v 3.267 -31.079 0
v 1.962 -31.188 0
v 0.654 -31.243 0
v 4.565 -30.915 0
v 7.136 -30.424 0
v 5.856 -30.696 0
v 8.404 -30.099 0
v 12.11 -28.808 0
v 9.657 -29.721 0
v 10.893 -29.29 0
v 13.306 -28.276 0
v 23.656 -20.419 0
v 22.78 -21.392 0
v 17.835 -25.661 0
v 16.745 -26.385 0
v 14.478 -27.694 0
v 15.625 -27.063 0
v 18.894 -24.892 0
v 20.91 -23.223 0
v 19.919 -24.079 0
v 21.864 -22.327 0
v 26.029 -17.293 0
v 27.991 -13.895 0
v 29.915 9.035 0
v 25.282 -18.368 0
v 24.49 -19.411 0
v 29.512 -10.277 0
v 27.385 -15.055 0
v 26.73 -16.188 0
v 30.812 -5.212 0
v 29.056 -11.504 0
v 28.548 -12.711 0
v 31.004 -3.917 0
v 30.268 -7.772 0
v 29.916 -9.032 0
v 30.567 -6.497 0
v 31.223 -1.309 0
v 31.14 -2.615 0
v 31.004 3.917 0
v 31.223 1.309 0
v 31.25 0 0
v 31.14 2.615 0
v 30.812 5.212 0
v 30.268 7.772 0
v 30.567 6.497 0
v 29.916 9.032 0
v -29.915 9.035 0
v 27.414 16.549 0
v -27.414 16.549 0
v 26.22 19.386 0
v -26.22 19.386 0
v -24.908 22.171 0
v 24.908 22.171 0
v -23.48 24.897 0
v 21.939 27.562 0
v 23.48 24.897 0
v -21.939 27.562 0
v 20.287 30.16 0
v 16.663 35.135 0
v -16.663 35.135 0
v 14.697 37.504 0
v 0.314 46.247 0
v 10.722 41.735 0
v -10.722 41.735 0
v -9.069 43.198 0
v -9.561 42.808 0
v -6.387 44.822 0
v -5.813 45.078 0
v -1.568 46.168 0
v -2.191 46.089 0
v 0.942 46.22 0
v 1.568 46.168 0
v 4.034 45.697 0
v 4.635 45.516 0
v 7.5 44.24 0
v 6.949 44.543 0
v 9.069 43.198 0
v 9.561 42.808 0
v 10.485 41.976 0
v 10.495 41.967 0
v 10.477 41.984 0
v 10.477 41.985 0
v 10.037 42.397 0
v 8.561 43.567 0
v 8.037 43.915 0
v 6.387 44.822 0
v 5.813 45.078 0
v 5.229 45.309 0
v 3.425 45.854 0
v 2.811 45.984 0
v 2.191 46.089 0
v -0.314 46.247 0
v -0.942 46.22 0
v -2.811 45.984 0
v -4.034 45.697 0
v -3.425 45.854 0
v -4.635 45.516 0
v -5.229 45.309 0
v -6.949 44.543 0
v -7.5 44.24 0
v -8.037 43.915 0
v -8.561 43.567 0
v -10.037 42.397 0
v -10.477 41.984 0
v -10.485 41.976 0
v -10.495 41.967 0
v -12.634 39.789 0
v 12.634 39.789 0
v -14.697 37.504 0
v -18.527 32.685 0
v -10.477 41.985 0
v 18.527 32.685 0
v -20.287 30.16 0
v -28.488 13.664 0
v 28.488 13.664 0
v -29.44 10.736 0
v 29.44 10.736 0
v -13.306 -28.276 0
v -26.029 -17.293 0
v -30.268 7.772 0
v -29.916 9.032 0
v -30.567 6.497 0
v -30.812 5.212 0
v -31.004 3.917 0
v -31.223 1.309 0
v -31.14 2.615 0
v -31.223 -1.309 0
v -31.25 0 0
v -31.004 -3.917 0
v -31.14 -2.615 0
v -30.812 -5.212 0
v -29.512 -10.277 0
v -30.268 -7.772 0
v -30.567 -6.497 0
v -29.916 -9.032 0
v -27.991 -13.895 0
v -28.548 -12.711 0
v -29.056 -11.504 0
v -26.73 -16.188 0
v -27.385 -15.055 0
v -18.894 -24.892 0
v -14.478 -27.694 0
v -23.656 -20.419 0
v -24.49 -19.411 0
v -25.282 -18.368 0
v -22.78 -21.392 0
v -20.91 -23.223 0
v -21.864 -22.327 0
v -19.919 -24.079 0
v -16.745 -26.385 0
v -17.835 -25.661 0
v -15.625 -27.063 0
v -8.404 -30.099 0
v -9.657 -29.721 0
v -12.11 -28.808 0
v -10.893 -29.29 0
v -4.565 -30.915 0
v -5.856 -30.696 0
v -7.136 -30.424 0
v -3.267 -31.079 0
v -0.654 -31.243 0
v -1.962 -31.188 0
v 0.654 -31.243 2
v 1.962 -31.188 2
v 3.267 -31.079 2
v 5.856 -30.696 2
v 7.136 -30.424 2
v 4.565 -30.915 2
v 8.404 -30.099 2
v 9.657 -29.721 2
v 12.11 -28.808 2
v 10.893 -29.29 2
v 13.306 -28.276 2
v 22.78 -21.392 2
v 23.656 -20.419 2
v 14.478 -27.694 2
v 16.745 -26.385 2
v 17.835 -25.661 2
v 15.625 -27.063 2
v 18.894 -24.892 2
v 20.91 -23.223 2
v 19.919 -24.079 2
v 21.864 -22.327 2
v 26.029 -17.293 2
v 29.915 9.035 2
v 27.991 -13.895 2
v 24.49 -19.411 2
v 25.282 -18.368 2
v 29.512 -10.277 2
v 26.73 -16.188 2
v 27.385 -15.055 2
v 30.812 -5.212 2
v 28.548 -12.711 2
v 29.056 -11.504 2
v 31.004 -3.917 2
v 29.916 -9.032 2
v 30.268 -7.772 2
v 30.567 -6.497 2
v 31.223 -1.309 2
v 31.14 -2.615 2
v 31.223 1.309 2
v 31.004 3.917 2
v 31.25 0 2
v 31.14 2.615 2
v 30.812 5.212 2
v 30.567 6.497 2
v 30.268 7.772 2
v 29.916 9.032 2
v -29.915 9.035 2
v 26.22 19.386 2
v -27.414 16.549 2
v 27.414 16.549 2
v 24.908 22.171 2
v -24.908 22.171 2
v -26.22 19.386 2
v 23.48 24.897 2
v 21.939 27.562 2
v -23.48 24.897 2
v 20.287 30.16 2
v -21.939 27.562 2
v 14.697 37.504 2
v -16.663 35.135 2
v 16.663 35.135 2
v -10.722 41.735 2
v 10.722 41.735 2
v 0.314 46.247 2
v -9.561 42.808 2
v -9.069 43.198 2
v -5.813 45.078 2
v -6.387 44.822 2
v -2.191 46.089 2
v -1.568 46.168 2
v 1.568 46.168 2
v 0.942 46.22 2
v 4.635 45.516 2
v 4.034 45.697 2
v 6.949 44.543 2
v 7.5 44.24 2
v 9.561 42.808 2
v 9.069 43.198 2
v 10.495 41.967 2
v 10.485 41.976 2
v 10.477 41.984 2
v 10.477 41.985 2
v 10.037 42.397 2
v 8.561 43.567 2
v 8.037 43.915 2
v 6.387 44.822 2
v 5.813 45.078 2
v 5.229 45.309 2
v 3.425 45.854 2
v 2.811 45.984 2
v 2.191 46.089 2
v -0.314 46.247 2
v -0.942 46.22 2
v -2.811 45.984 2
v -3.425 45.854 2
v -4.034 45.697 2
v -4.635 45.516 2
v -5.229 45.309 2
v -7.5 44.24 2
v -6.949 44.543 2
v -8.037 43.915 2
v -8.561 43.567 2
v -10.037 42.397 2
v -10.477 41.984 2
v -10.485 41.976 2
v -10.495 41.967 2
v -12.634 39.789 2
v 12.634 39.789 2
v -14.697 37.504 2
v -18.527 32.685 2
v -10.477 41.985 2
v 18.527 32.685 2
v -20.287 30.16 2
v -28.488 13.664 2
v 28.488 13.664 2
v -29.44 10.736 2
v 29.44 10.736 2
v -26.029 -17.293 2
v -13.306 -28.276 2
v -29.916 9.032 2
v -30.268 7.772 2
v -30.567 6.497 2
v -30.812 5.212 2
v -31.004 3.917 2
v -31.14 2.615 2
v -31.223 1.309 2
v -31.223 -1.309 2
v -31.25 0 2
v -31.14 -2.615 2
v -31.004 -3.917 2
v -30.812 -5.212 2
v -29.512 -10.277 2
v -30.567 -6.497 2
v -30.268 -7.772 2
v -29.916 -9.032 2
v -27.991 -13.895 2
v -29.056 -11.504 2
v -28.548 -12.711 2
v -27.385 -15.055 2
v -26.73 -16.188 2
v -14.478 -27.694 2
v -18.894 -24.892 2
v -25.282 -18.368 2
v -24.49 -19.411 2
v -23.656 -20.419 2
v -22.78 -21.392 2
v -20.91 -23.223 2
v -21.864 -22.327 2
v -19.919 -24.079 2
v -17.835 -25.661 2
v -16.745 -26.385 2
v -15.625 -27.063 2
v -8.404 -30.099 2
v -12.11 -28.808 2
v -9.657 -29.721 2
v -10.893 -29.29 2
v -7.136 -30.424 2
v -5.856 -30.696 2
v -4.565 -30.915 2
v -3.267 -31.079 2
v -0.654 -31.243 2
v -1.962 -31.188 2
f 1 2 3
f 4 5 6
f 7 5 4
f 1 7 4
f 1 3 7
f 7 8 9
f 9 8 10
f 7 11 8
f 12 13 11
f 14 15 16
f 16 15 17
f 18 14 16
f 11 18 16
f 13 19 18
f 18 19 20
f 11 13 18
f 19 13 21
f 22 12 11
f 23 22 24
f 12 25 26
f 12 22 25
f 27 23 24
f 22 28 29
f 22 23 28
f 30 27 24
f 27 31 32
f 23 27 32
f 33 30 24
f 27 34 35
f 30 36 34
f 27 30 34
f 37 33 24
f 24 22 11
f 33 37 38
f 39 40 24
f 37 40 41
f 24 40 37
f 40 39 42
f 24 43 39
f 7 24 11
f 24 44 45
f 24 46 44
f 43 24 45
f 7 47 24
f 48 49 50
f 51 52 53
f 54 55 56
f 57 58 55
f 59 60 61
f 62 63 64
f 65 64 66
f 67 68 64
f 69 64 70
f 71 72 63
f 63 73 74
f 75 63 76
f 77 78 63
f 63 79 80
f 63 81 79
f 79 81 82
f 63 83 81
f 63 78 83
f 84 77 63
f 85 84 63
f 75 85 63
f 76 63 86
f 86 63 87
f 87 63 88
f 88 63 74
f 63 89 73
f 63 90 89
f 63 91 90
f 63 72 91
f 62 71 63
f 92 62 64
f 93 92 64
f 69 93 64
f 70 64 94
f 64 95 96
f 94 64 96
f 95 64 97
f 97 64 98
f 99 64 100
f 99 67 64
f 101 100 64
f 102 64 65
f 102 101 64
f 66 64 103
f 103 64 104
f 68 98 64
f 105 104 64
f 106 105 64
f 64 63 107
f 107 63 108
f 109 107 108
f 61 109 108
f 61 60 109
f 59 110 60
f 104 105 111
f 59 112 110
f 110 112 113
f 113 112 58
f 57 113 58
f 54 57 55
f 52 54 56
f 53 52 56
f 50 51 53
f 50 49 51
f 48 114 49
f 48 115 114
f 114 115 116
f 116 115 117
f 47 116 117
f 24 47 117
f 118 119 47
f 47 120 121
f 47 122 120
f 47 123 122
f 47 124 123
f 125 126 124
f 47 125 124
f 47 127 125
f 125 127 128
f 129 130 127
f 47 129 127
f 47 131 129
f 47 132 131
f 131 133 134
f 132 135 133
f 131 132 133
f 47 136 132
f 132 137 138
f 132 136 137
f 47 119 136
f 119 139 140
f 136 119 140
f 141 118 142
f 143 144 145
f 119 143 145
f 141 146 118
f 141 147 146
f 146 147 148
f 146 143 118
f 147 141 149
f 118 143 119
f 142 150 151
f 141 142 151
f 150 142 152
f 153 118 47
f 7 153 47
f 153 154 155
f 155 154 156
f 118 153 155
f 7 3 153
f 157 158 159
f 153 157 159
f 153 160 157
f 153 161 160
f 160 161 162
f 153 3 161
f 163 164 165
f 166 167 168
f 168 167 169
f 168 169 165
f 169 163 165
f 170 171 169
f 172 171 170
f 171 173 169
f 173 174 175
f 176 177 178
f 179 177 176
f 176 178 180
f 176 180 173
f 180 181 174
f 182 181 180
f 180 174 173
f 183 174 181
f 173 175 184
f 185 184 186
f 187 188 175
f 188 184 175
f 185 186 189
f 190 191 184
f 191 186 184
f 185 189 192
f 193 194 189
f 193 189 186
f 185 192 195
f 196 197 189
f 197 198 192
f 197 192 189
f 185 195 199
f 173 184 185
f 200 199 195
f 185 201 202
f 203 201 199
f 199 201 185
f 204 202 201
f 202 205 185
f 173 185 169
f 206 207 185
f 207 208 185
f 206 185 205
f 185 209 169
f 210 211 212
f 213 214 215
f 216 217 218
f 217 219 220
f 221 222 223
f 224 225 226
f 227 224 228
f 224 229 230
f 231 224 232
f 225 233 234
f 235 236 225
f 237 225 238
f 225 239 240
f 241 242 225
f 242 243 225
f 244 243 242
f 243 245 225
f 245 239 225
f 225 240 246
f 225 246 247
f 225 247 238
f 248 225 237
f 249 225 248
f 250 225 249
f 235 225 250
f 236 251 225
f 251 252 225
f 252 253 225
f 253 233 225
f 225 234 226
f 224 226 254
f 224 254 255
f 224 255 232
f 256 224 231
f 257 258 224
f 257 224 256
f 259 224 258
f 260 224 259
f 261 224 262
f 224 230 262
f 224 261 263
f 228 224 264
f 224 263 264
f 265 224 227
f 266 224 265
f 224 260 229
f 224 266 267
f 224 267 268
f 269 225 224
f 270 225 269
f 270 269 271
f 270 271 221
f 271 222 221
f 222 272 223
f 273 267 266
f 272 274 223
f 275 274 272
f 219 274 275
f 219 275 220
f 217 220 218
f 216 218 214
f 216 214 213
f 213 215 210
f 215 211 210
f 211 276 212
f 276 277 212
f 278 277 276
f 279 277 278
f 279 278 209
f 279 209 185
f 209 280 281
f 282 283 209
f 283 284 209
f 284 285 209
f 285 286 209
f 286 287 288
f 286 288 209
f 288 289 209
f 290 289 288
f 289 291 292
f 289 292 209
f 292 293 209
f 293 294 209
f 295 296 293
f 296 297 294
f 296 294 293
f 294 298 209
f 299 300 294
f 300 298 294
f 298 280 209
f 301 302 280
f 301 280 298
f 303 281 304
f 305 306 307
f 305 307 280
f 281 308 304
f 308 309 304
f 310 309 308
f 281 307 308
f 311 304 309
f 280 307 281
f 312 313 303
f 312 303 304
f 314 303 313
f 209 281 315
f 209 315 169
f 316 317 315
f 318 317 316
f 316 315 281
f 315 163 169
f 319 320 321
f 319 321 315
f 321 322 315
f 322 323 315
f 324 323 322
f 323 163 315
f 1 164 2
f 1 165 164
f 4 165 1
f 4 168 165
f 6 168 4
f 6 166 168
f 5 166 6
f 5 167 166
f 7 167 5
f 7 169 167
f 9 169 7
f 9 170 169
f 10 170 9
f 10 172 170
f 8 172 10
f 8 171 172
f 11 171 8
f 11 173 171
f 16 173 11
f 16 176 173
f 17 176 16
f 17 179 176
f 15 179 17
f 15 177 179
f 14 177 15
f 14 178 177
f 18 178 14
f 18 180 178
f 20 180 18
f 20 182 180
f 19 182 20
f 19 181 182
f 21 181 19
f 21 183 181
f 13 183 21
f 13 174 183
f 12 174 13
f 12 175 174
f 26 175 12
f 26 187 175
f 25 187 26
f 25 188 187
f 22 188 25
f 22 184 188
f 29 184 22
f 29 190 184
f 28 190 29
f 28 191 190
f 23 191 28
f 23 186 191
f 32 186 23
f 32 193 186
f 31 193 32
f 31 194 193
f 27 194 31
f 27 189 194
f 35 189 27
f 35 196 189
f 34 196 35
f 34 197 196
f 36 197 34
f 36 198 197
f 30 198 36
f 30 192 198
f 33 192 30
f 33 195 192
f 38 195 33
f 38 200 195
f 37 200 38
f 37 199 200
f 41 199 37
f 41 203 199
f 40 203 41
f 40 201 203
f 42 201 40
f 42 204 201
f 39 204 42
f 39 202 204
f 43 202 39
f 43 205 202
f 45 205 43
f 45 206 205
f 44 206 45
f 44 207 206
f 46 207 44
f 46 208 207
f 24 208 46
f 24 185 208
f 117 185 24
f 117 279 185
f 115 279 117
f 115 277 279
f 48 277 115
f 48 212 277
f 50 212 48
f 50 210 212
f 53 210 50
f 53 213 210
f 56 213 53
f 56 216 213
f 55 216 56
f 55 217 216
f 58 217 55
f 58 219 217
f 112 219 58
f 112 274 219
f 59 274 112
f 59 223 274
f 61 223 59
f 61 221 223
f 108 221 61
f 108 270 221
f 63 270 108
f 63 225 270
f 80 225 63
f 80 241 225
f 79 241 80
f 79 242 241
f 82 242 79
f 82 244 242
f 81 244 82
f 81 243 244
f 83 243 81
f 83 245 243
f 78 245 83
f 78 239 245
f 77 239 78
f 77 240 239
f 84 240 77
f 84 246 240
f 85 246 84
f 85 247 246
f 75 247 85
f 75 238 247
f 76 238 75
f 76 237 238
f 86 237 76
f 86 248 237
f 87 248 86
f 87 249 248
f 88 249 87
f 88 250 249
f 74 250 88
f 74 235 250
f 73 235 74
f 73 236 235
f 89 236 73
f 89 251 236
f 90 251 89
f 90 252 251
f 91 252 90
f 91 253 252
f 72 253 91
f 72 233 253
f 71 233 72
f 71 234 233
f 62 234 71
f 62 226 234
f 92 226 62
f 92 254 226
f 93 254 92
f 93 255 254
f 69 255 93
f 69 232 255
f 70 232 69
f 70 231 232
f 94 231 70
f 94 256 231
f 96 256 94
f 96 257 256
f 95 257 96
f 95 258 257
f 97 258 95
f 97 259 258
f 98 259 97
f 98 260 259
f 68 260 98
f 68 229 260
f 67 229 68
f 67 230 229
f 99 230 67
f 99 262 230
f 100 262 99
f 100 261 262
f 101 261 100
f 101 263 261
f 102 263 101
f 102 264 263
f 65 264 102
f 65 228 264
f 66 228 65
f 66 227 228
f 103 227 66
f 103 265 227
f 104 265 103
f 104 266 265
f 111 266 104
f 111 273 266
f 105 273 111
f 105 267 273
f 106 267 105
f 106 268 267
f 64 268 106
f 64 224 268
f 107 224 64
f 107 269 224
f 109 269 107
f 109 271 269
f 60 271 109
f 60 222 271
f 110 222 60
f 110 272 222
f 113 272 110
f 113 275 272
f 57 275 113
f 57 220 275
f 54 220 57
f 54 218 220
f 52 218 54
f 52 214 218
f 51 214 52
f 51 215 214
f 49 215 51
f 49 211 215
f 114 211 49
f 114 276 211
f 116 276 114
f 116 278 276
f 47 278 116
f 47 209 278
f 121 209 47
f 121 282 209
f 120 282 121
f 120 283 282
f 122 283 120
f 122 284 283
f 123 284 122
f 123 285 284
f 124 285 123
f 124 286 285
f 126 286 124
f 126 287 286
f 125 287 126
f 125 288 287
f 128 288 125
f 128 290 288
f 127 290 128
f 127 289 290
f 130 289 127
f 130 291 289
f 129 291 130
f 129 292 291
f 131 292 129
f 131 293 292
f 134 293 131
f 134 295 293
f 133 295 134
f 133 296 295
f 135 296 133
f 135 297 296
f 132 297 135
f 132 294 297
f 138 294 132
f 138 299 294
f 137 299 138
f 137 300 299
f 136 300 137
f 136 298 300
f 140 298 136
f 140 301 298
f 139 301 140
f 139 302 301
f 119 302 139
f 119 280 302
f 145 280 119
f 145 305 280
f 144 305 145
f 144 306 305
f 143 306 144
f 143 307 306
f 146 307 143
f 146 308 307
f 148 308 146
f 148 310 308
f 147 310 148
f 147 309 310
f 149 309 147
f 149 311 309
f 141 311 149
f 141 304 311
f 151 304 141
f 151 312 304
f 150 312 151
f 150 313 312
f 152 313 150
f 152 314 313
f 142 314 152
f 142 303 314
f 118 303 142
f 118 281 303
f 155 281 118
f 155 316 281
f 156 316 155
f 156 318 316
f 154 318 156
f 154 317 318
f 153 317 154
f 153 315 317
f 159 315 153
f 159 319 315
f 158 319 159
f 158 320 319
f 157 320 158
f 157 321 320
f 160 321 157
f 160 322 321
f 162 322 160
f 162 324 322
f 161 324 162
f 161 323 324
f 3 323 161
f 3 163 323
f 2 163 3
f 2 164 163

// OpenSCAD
/*
  two-circular-arc cam generator by Knochi (mail@knochi.de)
  design from dimensionless variables based on research article of Emre Arabaci
  https://ms.copernicus.org/articles/10/497/2019/ms-10-497-2019.html
*/

$fn=150;
sMax=15; //maximum lift

/* [Dimensionless Design Variables] */
//λ=r2/r
lambda=0.48; //[0.00:0.01:1.00]
//µ=θmax/π
mu=0.42;     //[0.00:0.01:0.50]
//ψ=sMax/r (ψ>λ)
psi=0.6;    //[0.00:0.01:1.00] 


linear_extrude(2) twoCircArcCam(sMax,lambda,mu,0.4);

module twoCircArcCam(sMax=15,lambda=0.48,mu=0.42,psi=0.6){
  
  //constrain design variables
  lambda = (lambda<1) ? lambda : 1;
  mu = (mu<1) ? mu : 0.5;
  psi = (psi<1) ? (psi>lambda) ? psi : lambda : 1; //must be smaller than 1 but larger then lambda
  
  //calc from design variables
  r=sMax/psi;    //check!
  r2=r*lambda;   //check!
  theta0=mu*180; //check!

  //dimensions
  b2=sMax+r-r2; //check!

  b1Cntr=sMax*(2*b2-sMax);
  b1Dnmtr=2*(b2*(1-cos(theta0))-sMax);
  b1=b1Cntr/b1Dnmtr;      

  //angles
  theta1=asin(sin(theta0)*b2/(b1+r-r2));
  theta2=asin(sin(theta0)*b1/(b1+r-r2));
  
  //center of 1st Arc
  M1=polToCart(90-theta0,b1);
  
  circle(r);
  translate([0,b2]) circle(r2);

  for (im=[0,1])
    mirror([im,0]) intersection(){
      square([r,b2+r2]);
      translate(-M1) rotate(90-theta0) arc(b1+r,theta1);
    }
}

module arc(r=1,angle=60){
  //draws a closed arc shape from zero to target angle 
  //with same amount of fragments rotate_extrude(angle) would produce but with 2D output

  n= arcFragments(r,angle);
  polygon(arcPoints(r,angle,n));
}


// -- functions --
//harmonic motion
function sFromPhi(phi,sMax,beta)=
  sMax/2*(1-cos((PI*phi)/beta));

function polToCart(phi,r)= 
[r* cos(phi), r* sin(phi)];
  

function arcFragments(r,angle)=
  let(
    cirFrac=360/angle, //fraction of angle
    frgFrmFn= floor($fn/cirFrac), //fragments for arc calculated from fn
    minFrag=3 //minimum Fragments
  ) ($fn>minFrag) ? max(frgFrmFn,minFrag)+1 : ceil(max(min(angle/$fa,r*(2*PI/cirFrac)/$fs),minFrag));

//arc with constant radius
function arcPoints(r=1,angle=60,steps=10,poly=[[0,0]],iter)=
  let(
    iter = (iter == undef) ? steps-1 : iter,
    angInc=angle/(steps-1), //increment per step
    x= r*cos(angInc*iter),
    y= r*sin(angInc*iter)
  )(iter>=0) ? arcPoints(r,angle,steps,concat(poly,[[x,y]]),iter-1) : poly;
  
